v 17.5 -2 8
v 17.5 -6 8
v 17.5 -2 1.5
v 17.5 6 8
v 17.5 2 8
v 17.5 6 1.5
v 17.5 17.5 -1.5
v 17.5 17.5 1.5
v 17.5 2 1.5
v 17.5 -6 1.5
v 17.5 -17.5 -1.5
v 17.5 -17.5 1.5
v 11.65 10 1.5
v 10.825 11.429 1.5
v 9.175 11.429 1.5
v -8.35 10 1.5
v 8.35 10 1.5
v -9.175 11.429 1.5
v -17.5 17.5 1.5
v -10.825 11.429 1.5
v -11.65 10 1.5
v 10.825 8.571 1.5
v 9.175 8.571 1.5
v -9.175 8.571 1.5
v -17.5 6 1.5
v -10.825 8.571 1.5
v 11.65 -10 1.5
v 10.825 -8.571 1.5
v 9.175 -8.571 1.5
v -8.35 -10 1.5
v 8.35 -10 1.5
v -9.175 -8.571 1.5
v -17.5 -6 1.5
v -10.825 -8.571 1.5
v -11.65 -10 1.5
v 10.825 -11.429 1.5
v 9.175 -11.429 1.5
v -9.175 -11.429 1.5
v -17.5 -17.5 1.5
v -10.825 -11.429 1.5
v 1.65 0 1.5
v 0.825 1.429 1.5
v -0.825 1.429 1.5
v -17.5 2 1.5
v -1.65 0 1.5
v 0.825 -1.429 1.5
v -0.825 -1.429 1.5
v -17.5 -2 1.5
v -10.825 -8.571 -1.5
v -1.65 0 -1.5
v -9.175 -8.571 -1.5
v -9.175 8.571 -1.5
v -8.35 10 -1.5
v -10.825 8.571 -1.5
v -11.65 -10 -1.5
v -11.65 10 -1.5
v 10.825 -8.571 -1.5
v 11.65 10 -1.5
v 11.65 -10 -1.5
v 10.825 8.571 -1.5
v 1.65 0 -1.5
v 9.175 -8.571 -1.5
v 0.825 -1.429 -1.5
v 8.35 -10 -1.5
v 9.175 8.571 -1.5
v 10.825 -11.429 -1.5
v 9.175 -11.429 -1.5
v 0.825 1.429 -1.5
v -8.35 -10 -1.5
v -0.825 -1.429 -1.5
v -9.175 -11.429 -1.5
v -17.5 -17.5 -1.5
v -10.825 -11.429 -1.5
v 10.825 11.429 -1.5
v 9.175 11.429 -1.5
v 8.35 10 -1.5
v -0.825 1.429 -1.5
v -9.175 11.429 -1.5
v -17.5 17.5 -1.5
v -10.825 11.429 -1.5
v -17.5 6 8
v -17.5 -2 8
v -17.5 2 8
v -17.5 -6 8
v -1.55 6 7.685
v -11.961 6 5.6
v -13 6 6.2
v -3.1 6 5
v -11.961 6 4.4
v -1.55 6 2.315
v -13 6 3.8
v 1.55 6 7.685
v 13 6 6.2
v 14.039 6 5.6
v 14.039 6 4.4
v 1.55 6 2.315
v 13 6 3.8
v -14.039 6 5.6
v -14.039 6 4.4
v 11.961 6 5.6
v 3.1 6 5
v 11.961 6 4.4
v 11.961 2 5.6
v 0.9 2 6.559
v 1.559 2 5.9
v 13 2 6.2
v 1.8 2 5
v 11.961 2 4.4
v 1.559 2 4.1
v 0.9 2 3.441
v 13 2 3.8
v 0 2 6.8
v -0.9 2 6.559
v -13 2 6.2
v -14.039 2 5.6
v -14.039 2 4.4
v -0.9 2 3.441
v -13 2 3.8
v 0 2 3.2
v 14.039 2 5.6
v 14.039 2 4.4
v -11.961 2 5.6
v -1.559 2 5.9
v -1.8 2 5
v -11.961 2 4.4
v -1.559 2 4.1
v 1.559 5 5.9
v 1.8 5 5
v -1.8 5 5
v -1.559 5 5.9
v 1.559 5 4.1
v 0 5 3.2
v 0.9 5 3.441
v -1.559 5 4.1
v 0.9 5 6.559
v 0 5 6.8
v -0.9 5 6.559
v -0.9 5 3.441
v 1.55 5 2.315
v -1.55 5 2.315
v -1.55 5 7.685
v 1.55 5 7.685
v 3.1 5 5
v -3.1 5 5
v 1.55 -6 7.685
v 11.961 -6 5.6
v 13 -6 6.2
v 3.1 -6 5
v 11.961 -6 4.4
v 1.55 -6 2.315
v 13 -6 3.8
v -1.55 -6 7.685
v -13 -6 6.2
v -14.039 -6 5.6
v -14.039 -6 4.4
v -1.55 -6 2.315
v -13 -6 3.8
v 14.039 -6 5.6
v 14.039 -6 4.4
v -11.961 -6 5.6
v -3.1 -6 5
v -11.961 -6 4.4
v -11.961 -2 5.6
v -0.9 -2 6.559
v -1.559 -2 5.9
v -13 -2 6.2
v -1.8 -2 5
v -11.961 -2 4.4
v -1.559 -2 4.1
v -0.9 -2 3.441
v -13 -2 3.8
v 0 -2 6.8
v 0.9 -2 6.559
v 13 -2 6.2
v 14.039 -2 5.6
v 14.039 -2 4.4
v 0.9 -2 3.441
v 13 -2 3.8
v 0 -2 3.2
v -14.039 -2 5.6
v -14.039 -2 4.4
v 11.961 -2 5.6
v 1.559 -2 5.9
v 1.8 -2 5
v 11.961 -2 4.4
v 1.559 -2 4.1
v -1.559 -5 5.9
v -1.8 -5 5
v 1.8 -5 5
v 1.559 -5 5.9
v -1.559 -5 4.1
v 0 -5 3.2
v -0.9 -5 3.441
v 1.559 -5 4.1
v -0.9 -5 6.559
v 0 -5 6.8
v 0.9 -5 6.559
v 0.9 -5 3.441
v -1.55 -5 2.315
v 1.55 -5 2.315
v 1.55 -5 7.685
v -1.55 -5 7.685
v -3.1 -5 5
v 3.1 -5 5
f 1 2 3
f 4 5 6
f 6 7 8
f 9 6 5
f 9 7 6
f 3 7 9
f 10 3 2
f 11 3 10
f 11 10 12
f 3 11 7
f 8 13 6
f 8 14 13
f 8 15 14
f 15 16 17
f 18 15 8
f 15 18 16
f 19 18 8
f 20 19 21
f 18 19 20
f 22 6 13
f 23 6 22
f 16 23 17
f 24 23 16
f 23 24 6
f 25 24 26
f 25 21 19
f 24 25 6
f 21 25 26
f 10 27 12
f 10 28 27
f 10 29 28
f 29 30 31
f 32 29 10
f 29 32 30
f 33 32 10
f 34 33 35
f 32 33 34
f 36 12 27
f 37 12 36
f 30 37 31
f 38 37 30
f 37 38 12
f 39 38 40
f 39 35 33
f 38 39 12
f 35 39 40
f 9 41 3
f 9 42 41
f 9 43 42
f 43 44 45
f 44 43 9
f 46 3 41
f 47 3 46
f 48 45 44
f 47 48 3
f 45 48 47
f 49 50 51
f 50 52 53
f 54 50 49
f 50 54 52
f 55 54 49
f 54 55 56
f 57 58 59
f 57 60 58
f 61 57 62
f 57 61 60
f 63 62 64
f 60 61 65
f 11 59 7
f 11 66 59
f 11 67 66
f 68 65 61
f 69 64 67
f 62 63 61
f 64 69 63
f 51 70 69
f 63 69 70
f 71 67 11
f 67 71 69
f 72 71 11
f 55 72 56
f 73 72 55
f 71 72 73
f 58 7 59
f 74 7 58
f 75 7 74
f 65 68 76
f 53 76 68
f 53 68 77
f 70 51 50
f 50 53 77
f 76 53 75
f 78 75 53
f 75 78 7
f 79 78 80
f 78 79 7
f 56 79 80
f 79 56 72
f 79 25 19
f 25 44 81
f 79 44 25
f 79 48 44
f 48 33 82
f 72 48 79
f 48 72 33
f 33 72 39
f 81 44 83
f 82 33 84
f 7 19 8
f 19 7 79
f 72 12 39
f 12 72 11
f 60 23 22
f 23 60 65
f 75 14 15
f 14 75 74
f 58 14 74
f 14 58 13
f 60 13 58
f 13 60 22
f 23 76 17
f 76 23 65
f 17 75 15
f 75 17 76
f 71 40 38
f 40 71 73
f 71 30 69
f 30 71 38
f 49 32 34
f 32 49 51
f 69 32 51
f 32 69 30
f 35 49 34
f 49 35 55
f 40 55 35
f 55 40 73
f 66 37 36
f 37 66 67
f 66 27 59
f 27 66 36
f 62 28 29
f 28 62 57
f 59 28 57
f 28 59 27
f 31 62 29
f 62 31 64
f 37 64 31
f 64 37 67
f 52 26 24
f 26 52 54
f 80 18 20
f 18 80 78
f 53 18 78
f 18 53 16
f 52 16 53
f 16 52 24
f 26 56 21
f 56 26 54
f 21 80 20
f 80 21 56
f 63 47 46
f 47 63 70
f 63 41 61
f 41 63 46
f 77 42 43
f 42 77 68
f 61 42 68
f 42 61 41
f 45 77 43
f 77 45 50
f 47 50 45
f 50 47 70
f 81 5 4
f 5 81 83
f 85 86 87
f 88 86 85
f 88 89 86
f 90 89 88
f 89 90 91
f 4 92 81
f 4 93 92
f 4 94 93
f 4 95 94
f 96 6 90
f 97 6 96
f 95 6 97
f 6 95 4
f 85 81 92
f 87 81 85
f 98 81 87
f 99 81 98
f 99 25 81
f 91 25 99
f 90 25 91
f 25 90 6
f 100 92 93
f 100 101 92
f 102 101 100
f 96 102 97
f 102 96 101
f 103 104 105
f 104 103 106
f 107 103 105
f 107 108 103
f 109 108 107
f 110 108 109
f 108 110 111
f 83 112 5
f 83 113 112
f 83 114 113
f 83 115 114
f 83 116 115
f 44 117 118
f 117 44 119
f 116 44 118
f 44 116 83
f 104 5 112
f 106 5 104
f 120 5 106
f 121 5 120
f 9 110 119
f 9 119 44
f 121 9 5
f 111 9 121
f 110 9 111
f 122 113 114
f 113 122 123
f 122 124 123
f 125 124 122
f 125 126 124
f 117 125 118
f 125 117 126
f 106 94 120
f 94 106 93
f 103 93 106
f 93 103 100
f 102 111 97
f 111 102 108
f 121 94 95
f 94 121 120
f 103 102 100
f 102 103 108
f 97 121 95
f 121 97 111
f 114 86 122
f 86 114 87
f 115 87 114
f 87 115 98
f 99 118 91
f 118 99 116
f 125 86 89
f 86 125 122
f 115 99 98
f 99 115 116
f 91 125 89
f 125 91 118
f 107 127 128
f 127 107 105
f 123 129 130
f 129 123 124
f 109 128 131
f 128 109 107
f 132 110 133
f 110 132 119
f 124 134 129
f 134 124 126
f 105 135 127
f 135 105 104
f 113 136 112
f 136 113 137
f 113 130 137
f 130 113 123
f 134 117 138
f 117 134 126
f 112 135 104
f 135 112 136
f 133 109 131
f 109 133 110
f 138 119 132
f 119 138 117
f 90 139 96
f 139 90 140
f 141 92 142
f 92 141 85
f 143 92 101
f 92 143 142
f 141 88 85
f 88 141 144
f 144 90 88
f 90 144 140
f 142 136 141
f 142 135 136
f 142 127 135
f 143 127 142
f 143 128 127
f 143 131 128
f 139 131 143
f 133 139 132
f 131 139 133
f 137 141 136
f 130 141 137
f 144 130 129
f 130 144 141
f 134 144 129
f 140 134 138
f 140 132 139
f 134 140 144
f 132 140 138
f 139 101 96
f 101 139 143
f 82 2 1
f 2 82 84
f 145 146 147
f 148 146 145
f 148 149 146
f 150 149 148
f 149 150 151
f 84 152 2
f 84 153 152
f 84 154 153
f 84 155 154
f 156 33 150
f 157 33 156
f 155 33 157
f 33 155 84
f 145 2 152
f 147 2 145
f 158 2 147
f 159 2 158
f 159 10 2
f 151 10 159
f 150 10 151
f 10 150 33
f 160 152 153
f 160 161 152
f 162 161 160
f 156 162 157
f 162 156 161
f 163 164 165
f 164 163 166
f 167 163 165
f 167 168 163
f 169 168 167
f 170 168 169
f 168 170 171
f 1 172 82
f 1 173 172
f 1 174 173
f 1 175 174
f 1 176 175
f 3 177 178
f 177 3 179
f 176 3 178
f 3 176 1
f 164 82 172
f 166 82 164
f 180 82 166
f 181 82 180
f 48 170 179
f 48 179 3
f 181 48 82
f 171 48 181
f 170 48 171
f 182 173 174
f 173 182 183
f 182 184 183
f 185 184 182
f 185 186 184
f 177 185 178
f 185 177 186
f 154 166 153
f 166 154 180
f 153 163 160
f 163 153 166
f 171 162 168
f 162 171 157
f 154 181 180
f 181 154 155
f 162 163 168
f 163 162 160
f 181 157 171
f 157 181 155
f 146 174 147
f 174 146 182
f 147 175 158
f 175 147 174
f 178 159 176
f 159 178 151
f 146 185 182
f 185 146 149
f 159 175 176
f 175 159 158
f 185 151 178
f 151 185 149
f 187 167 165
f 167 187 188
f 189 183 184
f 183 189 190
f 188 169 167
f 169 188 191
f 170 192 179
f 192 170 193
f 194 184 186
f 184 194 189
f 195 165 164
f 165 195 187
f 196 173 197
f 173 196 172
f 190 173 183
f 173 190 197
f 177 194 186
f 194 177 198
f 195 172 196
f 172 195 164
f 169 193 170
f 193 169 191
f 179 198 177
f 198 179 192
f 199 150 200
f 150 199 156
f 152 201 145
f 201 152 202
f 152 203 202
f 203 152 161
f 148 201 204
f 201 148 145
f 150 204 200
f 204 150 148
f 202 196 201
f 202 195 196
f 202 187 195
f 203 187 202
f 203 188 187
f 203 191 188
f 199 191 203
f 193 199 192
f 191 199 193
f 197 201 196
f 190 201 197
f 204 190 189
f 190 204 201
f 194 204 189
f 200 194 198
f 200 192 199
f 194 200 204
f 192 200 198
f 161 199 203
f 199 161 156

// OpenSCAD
M3 = 1.65;
M3F = 1.8;
M3H = 3.1;
LGR = 1.2;

TXB = 10;
TYB = 10;

module top_plate(){
	difference(){
		cube(size=[35,35,3], center=true);

		translate([TXB,TYB,0]) cylinder(r=M3, h=10, center=true);
		translate([-TXB,-TYB,0]) cylinder(r=M3, h=10, center=true);
		translate([TXB,-TYB,0]) cylinder(r=M3, h=10, center=true);
		translate([-TXB,TYB,0]) cylinder(r=M3, h=10, center=true);

		cylinder(r=M3, h=10, center=true);
	}
}

module side(){
	difference(){
		cube(size=[35,4,9], center=true);

		translate([13,0,1.5]) rotate([90,30,0]) cylinder(r=LGR, h=50, $fn=6, center=true);
		translate([-13,0,1.5]) rotate([90,30,0]) cylinder(r=LGR, h=50, $fn=6, center=true);

		translate([0,0,1.5]) rotate([90,30,0]) cylinder(r=M3F, h=50, $fn=12, center=true);
		translate([0,3.5,1.5]) rotate([90,0,0]) cylinder(r=M3H, h=5, $fn=6, center=true);

	}
}

union(){
	top_plate();
	translate([0,4,3.5]) side();
	translate([0,-4,3.5]) rotate([0,0,180]) side();

}
